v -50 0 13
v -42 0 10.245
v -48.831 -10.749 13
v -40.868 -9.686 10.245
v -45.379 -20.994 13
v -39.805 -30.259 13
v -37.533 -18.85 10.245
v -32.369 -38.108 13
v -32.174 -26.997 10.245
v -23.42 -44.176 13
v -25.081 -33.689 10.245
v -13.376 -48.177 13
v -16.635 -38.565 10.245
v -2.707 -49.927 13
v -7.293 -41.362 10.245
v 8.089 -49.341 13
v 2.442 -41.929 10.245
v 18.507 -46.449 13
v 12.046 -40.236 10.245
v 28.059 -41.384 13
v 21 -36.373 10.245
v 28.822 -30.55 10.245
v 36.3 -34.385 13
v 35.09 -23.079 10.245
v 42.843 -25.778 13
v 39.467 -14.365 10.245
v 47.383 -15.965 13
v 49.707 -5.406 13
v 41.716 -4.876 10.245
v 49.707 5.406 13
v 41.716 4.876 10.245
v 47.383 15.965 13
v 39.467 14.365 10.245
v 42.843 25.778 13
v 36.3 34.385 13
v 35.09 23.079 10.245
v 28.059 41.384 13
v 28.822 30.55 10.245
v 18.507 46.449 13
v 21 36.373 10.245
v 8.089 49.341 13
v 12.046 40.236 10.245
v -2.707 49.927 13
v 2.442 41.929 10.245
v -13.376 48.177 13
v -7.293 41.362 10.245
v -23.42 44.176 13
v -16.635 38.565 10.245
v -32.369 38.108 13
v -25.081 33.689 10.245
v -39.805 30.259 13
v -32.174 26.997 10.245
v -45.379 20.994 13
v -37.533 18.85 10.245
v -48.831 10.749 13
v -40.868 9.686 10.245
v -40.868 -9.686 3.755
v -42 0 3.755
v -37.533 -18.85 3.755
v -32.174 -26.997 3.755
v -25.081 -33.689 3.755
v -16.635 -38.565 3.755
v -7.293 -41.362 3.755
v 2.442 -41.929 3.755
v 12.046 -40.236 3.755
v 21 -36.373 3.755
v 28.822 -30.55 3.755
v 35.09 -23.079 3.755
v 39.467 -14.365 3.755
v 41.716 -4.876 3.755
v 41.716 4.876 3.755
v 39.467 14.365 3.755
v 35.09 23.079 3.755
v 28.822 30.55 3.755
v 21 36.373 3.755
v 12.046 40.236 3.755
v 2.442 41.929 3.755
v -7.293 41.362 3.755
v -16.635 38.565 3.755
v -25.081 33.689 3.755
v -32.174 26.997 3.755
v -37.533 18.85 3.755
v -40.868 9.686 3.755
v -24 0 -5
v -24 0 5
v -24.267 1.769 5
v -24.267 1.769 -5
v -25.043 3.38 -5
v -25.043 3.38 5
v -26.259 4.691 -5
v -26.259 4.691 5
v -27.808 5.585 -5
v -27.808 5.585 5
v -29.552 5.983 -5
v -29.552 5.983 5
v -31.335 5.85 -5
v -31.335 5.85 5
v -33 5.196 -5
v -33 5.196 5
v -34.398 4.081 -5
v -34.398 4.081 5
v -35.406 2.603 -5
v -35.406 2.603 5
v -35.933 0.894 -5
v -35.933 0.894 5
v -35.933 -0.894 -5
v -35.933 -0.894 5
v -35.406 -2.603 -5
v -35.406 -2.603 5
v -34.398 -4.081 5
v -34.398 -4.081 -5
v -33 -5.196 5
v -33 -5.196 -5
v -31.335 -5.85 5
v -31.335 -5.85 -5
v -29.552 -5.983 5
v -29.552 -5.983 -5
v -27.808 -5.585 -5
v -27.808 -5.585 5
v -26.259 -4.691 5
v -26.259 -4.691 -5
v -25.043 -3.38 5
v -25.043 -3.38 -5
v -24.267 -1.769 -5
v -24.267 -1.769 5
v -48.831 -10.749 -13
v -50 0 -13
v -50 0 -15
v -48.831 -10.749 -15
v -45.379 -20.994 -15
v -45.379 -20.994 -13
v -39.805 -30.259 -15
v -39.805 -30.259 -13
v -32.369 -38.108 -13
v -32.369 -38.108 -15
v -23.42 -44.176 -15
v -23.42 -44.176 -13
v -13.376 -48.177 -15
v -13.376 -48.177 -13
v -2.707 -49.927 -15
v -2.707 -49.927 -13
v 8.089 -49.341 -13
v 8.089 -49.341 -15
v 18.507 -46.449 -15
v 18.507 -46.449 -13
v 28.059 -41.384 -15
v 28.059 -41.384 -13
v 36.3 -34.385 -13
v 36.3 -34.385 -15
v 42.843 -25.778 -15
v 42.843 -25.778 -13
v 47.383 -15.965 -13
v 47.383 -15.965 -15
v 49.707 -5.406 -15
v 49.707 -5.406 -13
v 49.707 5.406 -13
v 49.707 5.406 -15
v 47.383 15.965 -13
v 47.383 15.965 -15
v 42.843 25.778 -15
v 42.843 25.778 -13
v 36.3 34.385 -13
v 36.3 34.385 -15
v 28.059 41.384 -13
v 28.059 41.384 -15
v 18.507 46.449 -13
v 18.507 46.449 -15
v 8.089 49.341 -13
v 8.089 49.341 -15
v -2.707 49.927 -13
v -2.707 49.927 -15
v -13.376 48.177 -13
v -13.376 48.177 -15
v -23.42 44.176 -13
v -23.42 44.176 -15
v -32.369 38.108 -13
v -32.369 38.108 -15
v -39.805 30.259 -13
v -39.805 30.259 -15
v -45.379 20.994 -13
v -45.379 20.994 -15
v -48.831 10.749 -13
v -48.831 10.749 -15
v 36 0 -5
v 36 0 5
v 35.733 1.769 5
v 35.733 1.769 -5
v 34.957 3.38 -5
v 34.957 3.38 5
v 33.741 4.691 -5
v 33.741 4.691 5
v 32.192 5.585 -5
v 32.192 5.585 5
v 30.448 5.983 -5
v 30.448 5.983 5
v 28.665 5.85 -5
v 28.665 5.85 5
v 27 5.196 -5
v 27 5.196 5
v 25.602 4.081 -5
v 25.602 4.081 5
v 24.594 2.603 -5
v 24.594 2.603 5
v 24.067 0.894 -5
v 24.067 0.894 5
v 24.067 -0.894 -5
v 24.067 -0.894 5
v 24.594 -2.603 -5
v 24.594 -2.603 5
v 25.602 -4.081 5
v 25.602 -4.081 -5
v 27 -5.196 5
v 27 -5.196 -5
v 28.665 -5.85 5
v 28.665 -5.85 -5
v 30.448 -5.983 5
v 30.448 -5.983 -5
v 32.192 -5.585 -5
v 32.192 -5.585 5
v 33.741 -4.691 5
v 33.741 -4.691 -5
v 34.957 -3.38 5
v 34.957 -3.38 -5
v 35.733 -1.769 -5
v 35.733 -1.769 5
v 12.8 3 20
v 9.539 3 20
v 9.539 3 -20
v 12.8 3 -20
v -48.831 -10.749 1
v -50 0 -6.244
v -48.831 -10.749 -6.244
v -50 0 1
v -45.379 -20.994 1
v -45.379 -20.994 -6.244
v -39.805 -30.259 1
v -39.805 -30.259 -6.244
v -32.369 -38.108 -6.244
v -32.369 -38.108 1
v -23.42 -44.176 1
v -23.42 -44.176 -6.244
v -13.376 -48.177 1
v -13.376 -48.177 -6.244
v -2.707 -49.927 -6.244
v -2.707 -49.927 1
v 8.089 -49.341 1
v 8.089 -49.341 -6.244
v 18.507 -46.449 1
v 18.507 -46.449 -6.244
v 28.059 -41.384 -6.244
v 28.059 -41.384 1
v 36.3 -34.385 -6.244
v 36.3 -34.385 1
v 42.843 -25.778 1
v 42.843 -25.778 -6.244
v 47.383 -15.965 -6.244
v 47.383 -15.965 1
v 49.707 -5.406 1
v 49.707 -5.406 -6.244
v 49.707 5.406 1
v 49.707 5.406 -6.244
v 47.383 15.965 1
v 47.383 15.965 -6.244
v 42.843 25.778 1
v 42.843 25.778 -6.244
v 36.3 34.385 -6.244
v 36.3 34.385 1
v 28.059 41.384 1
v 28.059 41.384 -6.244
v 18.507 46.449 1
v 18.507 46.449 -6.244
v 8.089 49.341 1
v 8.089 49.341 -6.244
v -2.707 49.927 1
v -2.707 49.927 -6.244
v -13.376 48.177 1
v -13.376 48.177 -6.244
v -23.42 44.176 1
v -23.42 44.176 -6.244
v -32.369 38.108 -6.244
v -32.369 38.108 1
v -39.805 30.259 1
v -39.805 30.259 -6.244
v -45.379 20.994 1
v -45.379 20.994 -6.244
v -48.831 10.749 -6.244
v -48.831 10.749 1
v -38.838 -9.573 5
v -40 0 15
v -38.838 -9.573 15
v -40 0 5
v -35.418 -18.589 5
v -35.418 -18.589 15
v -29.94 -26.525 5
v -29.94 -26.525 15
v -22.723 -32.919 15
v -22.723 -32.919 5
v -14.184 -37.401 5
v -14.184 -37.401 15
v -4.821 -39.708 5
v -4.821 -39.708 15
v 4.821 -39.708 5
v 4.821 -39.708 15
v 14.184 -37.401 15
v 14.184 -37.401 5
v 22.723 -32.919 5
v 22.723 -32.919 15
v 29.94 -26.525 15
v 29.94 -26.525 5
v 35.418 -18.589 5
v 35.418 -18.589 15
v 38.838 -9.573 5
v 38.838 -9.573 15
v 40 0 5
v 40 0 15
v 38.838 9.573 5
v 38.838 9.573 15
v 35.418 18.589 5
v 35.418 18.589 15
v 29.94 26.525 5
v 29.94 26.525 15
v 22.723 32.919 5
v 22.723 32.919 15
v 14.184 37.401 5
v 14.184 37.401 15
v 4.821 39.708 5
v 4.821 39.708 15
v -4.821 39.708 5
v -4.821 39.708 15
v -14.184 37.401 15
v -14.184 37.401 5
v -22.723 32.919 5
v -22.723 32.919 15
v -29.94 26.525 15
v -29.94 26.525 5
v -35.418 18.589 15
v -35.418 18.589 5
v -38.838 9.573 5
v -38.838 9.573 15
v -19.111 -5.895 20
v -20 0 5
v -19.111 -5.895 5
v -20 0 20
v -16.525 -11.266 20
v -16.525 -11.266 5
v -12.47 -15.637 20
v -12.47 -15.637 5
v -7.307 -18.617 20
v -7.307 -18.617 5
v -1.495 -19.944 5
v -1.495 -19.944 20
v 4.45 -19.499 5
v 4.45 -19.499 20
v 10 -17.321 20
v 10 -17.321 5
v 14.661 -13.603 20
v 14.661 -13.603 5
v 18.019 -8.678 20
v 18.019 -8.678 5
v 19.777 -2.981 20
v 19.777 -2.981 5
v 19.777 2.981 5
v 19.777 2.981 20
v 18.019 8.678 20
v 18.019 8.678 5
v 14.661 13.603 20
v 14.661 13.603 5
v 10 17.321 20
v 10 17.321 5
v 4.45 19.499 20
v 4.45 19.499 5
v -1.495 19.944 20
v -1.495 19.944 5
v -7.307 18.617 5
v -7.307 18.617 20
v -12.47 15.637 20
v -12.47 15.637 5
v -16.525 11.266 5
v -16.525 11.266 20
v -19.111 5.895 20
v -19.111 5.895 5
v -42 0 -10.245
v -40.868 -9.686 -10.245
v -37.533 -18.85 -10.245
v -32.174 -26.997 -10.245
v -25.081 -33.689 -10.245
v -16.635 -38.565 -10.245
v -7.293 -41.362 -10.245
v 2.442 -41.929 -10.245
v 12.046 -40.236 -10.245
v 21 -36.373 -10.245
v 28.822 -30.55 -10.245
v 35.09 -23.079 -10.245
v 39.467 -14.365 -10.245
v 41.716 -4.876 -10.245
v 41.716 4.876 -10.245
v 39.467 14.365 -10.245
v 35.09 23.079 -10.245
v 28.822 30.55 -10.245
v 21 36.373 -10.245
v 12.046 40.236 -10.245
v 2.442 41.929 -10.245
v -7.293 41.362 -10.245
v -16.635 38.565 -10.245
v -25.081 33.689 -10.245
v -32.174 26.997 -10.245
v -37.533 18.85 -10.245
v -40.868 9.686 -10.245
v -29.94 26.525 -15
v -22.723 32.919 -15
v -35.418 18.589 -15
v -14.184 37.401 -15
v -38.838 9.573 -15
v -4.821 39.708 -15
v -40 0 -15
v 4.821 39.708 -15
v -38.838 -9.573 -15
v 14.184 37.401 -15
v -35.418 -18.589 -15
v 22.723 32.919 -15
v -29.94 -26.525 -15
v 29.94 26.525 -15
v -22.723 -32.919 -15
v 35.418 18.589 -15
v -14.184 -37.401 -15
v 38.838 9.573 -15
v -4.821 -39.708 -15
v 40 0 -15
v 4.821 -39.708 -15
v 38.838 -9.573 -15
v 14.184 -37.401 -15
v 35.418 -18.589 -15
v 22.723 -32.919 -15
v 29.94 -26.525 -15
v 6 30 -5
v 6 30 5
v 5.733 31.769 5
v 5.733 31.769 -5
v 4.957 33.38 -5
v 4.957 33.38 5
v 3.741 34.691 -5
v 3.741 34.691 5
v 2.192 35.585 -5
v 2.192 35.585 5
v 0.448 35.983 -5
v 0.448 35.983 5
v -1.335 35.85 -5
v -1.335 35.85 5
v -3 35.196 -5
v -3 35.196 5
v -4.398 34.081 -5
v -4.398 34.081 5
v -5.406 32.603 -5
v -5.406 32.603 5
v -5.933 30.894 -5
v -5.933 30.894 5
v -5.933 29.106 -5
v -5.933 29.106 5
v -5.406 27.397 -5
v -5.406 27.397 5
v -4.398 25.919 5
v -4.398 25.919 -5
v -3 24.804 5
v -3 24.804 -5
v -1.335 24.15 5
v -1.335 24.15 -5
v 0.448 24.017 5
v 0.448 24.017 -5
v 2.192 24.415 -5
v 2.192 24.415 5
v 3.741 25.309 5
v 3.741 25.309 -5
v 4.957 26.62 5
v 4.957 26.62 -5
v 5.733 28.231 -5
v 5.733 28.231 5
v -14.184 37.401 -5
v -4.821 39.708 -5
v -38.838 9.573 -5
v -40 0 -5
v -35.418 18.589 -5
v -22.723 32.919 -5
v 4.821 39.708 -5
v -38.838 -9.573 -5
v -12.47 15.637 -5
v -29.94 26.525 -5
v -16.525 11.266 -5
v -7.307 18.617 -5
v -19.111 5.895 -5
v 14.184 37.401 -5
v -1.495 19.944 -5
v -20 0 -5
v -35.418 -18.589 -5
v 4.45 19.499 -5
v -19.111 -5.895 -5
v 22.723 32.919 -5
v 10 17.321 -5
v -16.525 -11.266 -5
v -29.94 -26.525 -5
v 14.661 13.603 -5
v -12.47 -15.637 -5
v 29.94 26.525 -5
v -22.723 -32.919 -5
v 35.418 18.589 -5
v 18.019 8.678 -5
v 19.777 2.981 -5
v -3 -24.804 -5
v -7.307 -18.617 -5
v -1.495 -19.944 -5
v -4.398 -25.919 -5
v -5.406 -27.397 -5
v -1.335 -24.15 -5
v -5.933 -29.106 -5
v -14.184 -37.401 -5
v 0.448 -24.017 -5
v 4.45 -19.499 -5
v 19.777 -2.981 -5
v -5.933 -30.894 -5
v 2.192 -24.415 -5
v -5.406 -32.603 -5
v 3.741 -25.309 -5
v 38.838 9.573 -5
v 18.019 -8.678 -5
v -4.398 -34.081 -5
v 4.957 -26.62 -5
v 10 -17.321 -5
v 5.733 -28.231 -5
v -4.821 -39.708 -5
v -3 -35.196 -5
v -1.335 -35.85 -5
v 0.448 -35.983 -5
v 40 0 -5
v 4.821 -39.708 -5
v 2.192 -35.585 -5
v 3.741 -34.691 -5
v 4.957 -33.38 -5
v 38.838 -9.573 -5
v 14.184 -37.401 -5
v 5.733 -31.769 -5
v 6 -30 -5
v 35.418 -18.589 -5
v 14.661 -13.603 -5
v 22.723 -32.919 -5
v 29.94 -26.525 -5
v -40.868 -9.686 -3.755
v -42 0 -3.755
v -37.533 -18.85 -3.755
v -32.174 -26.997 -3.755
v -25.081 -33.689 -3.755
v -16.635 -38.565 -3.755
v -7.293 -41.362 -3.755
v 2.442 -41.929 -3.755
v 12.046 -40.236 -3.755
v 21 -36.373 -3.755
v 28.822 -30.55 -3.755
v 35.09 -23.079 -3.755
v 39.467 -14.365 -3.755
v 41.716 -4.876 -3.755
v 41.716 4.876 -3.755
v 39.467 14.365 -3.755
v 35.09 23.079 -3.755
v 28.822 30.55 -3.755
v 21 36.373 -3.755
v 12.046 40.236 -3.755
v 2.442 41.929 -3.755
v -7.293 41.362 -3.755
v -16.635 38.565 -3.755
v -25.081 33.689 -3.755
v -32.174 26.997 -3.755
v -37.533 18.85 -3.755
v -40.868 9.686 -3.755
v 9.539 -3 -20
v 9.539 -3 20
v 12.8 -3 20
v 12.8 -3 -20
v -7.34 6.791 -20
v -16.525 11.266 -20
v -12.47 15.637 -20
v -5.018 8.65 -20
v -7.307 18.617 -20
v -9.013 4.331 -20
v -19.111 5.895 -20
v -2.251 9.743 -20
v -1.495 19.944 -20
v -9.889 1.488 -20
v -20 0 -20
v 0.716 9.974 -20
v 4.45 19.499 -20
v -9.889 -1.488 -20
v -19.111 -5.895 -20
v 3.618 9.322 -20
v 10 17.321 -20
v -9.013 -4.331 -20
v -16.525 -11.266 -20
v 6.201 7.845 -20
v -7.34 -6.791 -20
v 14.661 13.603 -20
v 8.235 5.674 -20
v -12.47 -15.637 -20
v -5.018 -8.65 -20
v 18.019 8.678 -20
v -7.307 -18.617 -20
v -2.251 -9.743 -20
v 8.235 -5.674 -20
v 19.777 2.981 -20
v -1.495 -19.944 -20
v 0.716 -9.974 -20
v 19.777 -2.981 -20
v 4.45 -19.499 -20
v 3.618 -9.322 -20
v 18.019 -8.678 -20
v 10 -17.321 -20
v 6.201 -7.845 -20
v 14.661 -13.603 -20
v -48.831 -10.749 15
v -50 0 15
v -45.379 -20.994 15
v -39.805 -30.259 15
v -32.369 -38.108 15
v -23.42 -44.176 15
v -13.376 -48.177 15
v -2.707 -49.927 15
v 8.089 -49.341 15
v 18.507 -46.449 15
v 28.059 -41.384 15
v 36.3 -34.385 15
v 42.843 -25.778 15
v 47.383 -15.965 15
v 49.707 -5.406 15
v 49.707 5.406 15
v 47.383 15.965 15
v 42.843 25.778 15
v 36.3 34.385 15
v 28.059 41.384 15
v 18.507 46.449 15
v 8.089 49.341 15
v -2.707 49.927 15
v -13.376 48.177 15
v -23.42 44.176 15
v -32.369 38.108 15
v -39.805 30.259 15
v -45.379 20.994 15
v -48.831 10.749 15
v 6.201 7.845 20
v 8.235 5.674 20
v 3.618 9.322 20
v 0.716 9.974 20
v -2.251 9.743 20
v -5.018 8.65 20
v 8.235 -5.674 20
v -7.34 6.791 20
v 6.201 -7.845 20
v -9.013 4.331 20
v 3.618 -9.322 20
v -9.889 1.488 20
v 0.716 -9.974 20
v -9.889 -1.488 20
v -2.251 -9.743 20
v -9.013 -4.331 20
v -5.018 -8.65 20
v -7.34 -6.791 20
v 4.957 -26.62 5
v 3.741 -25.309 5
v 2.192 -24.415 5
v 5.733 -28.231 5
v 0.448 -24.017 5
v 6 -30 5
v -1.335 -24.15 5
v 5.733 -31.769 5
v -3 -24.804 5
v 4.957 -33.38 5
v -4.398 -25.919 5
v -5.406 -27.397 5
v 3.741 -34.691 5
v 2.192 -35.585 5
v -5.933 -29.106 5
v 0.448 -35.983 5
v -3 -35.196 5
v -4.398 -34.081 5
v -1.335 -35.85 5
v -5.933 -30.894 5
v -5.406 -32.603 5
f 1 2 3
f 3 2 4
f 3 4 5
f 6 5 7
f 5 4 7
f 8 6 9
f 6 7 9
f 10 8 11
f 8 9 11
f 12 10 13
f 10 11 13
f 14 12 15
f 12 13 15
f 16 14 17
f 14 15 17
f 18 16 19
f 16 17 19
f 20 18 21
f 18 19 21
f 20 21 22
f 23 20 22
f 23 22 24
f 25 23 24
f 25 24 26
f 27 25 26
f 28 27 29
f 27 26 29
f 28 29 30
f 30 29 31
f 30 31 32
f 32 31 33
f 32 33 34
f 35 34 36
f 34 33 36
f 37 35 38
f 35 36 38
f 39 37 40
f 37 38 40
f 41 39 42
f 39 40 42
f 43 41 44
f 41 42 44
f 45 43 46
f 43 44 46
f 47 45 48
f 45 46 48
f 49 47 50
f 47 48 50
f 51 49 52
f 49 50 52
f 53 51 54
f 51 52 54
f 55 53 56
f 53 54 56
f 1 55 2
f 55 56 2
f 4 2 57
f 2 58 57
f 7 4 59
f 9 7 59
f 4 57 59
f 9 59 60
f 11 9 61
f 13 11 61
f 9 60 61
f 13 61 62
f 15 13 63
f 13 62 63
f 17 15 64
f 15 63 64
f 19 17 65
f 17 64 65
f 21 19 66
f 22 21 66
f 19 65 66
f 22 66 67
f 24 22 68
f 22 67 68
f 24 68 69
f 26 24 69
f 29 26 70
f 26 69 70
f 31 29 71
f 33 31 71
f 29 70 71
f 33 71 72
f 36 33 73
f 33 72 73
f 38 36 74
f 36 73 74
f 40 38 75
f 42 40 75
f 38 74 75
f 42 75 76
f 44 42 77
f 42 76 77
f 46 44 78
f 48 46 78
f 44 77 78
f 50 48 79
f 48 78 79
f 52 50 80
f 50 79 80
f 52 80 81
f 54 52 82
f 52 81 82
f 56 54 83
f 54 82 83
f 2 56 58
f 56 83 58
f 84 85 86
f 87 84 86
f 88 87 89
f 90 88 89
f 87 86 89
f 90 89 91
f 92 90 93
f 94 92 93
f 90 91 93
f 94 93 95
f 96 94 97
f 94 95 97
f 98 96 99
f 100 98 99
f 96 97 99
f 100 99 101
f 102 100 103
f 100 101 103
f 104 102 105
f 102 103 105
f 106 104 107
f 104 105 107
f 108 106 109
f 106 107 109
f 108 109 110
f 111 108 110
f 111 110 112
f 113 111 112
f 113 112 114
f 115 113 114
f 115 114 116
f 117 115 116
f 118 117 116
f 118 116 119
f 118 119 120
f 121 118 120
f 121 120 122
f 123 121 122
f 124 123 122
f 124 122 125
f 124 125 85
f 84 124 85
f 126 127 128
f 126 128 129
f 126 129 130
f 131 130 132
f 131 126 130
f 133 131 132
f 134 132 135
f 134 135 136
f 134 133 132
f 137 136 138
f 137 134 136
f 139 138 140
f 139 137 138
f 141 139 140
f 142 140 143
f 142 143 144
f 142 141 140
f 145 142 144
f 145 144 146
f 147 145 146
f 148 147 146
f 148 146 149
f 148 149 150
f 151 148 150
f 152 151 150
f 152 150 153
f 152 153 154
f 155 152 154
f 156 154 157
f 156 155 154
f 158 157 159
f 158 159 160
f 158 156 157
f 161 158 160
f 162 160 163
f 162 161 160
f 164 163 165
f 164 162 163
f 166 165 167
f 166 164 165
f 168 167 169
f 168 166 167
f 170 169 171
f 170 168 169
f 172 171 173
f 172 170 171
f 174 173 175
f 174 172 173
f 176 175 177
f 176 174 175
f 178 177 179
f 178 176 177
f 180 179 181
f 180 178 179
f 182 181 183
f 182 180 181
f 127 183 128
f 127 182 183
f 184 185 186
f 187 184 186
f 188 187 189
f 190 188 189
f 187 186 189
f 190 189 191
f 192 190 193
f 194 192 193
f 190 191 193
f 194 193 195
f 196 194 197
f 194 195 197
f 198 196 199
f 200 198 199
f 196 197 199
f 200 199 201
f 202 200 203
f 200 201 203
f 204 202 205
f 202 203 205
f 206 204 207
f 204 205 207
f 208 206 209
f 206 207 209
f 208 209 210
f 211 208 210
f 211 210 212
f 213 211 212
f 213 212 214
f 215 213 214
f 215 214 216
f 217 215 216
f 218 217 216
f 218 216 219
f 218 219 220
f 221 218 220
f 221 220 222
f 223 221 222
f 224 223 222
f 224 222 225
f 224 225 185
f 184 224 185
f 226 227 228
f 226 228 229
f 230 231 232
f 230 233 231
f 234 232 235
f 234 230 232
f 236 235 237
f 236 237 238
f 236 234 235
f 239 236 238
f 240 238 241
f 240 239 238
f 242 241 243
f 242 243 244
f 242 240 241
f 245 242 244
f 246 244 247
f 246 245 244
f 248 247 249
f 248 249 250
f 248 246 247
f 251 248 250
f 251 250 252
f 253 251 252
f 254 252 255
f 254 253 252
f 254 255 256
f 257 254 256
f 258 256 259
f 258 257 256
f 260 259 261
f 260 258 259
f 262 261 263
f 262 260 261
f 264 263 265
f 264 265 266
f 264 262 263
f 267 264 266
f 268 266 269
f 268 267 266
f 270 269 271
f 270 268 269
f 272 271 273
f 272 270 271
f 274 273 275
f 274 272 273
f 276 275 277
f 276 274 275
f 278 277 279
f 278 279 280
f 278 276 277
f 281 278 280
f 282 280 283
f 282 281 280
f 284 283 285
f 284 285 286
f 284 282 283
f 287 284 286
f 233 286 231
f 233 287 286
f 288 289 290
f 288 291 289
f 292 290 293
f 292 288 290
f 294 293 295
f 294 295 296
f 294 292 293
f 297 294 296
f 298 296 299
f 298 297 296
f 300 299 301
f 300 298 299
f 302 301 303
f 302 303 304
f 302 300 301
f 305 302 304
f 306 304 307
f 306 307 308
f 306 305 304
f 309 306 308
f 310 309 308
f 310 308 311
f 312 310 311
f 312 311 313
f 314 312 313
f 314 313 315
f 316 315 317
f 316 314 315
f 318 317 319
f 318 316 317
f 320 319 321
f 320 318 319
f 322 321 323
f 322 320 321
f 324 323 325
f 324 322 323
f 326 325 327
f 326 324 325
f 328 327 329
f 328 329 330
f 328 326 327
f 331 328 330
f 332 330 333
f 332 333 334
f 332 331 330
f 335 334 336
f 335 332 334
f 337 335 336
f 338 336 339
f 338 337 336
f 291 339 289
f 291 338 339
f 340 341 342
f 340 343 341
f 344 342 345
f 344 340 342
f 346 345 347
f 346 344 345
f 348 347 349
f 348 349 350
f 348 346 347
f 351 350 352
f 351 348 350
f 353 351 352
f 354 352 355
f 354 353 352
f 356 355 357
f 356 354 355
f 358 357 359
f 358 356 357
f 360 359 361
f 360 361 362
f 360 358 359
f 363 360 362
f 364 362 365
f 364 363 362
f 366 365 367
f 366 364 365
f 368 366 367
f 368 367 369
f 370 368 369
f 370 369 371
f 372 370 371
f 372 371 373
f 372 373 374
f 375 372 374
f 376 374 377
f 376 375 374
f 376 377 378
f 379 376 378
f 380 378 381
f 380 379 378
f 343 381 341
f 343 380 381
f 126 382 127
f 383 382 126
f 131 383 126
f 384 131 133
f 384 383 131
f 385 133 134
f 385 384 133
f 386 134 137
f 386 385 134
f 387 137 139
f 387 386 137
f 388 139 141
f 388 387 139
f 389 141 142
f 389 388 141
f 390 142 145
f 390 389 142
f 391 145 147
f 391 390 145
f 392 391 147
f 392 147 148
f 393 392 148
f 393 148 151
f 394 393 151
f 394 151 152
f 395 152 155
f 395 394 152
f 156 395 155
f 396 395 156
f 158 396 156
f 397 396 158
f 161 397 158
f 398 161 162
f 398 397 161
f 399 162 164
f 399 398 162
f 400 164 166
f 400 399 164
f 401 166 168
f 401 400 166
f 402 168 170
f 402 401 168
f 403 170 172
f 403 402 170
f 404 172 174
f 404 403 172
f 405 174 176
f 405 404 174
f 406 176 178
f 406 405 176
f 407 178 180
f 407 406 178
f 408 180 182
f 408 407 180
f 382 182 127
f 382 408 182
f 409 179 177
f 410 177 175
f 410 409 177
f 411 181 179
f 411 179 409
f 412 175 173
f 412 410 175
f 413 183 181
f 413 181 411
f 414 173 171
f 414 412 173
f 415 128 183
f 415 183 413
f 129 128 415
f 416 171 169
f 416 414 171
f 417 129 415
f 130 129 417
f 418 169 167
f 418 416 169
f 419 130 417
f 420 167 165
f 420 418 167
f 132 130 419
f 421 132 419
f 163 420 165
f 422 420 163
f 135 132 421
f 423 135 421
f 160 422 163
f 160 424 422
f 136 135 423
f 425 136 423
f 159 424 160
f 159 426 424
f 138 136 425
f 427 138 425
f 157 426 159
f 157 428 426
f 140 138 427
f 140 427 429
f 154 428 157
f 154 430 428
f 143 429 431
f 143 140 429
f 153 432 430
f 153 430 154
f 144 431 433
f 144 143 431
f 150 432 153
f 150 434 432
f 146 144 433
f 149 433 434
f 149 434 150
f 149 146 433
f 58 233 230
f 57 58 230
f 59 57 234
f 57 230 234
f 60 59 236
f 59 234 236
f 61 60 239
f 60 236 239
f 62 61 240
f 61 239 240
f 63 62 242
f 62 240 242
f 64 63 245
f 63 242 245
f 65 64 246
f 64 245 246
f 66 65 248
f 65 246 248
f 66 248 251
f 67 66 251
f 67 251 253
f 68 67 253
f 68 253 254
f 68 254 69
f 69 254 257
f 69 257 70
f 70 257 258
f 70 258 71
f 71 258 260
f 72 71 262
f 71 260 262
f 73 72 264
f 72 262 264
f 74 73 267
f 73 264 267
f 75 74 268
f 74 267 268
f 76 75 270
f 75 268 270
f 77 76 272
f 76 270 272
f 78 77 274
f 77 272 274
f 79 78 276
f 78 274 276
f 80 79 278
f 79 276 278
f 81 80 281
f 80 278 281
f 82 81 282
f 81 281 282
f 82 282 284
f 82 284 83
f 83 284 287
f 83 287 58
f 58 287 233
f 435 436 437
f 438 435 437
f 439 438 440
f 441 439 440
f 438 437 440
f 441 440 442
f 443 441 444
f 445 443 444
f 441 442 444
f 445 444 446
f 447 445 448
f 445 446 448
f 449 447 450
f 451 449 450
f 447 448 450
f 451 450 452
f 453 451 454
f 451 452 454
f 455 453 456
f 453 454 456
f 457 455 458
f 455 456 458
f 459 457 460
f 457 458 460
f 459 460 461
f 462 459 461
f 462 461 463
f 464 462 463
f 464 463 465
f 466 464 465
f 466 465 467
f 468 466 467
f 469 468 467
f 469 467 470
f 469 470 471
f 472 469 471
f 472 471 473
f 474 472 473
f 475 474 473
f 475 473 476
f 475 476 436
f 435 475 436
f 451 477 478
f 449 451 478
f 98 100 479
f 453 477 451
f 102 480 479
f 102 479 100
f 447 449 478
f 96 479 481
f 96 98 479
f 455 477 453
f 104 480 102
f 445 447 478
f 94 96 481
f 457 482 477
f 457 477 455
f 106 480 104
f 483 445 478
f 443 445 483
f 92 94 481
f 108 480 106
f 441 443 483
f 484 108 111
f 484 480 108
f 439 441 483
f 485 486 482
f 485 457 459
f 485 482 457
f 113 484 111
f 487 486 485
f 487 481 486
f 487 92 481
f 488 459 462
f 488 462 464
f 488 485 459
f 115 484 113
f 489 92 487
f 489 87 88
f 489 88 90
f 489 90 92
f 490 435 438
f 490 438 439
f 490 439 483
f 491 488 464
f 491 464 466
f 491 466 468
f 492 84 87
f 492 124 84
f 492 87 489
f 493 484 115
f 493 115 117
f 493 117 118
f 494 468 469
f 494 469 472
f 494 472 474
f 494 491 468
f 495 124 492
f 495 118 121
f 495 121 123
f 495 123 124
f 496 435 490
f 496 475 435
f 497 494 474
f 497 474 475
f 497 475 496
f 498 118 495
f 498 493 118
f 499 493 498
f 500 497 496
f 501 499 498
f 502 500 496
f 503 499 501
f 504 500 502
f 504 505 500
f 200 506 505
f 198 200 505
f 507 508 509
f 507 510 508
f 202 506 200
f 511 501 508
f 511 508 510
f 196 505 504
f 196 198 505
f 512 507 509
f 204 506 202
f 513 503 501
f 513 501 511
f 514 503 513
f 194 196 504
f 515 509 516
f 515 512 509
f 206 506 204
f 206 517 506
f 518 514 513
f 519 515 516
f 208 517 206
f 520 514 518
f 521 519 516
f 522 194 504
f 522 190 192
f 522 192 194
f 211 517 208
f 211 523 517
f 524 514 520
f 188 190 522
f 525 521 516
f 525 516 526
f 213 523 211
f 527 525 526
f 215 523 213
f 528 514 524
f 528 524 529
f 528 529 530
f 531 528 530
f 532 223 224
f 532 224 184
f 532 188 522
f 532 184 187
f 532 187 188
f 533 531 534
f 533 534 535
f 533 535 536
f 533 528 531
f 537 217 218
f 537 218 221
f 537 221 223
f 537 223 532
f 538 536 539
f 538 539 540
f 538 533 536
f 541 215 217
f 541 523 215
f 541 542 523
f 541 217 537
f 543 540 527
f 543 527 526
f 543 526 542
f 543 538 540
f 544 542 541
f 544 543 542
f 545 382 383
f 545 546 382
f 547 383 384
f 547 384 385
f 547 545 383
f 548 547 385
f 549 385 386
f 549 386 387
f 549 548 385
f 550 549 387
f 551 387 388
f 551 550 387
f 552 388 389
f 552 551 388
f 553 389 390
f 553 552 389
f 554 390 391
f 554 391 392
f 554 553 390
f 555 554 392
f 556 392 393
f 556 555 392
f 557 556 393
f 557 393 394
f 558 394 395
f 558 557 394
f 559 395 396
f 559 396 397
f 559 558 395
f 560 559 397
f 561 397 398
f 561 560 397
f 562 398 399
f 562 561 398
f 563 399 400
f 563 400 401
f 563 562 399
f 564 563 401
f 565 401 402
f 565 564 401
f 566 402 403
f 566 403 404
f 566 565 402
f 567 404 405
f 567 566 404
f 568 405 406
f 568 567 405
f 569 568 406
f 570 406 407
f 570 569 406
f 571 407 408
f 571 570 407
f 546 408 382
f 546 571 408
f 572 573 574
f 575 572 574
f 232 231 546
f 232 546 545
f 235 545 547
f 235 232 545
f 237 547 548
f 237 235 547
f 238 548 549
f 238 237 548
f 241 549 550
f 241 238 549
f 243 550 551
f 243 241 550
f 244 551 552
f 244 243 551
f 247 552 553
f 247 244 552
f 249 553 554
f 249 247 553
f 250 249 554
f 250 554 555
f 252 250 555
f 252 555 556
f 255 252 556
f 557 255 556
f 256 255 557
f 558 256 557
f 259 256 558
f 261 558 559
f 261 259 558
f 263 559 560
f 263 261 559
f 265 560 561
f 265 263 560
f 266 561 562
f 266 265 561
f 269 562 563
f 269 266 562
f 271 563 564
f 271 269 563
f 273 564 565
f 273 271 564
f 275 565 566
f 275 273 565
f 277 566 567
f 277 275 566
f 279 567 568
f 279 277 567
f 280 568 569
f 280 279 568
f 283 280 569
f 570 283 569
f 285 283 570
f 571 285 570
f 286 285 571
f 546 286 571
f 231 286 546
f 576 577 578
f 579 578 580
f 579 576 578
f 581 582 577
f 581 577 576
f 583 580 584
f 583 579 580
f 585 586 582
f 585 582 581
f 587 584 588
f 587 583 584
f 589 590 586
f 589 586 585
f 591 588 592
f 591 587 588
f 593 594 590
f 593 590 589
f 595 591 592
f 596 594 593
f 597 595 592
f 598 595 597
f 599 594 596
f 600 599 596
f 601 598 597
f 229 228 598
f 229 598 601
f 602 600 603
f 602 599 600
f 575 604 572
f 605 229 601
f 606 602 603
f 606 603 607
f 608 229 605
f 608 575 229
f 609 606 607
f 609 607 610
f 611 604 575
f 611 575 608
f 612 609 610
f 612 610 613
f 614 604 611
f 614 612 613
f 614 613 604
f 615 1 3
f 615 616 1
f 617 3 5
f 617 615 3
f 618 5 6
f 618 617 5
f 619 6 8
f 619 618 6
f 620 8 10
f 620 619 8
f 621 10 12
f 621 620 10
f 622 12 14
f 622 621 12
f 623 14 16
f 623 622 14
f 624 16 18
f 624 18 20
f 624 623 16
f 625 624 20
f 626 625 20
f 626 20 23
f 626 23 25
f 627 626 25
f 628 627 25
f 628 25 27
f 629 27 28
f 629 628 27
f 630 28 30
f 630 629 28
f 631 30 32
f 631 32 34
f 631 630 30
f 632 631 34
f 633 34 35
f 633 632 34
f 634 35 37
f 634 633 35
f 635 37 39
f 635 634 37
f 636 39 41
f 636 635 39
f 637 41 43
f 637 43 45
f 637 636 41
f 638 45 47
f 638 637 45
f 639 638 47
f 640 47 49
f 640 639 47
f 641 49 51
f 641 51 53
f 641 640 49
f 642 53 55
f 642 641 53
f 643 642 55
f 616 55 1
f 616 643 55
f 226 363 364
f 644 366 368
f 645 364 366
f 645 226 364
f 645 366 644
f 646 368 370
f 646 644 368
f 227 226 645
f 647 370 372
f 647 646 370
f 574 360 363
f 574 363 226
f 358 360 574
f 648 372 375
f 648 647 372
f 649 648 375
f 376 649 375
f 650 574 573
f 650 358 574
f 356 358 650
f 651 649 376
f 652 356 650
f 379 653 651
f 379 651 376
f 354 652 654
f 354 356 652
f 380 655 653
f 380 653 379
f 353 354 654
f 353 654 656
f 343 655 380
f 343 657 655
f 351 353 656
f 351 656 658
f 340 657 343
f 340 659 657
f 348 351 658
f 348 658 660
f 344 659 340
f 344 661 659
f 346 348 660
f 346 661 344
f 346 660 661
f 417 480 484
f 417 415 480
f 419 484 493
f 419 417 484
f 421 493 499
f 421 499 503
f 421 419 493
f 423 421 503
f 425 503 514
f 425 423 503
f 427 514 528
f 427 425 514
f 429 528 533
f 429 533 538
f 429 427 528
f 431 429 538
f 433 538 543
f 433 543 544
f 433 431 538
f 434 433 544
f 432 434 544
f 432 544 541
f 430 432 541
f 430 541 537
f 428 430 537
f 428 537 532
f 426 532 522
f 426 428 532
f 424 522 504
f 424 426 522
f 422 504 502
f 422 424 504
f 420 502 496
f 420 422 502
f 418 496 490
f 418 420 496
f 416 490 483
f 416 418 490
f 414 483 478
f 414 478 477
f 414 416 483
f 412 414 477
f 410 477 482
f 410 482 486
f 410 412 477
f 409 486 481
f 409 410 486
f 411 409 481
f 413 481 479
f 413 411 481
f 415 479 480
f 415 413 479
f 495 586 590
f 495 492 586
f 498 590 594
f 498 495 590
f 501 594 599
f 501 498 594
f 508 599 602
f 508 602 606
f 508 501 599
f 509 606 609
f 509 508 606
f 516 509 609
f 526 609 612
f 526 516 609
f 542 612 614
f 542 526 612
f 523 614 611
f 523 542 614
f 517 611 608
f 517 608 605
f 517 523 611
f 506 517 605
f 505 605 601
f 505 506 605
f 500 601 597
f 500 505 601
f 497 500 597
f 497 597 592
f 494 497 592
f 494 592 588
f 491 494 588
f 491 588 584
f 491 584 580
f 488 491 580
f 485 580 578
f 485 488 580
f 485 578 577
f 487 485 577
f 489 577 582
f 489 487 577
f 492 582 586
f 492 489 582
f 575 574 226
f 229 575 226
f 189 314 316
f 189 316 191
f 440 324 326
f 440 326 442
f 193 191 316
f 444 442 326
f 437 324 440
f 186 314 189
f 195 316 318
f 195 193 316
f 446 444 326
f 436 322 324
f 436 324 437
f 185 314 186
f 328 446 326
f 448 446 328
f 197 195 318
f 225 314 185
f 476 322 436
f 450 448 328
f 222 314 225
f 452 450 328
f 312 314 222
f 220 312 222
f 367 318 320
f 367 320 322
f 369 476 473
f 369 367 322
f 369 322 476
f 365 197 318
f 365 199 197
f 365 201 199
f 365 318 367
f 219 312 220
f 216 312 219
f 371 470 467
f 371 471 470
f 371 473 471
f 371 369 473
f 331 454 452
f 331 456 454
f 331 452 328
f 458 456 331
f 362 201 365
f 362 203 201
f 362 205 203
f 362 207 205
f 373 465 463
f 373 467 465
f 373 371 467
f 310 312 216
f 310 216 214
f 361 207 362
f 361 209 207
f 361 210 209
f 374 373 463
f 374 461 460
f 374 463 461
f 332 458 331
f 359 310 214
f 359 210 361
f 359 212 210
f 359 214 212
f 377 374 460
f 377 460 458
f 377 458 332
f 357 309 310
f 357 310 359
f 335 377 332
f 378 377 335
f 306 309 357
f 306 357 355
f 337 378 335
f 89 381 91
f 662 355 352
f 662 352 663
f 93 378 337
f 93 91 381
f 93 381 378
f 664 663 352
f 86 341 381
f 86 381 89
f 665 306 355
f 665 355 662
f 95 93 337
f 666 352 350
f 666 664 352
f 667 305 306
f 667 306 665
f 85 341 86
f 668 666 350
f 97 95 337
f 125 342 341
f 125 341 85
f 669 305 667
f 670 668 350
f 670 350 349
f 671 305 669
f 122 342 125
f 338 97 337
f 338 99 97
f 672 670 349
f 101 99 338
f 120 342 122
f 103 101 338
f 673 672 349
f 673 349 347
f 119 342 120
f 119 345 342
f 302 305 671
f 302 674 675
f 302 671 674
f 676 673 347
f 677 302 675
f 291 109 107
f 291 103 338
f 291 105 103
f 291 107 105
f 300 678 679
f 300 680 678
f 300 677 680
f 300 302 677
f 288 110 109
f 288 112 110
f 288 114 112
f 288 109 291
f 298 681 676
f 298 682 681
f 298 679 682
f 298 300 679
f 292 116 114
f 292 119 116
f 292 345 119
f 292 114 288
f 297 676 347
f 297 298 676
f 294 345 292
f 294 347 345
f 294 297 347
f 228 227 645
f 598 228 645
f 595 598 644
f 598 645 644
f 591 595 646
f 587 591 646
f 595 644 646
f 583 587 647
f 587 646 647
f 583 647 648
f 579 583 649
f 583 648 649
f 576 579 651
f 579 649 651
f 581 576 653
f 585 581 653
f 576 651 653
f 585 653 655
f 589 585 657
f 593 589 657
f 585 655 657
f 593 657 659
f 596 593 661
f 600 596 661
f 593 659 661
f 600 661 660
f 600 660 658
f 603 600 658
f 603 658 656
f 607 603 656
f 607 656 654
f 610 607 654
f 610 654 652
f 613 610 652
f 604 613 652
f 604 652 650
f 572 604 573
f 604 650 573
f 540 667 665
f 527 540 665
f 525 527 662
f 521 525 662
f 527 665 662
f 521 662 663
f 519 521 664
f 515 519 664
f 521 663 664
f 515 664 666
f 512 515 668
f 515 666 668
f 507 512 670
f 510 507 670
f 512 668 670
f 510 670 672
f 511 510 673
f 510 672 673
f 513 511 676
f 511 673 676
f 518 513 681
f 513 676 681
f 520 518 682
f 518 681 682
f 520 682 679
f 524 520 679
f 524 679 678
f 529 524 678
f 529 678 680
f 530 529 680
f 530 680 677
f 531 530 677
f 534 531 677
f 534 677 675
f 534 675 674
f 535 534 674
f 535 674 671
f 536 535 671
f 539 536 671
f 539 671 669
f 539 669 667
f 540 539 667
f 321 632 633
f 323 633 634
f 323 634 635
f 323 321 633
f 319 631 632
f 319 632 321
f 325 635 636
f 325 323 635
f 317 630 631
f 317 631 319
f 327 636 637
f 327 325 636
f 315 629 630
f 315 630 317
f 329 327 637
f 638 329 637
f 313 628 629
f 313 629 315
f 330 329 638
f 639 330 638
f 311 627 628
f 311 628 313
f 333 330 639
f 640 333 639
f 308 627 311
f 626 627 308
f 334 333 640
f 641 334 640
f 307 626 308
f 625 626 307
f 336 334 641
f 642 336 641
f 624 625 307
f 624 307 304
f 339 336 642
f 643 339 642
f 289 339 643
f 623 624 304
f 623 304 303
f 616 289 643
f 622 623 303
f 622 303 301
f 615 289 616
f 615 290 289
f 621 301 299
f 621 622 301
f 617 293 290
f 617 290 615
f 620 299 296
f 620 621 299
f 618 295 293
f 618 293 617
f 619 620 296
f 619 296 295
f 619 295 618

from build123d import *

# Parameters (mm, degrees)
SKETCH_3_W          = 12.8
SKETCH_3_H          = 6
CUT_EXTRUDE_1_DEPTH = 82.240384046
SKETCH_4_R          = 6
CUT_EXTRUDE_2_DEPTH = 82.240384046
SKETCH_5_R          = 10
CUT_EXTRUDE_3_DEPTH = 101


with BuildPart() as part:
    # 草图1 → 旋转1 (revolve)
    with BuildSketch(Plane(origin=(0, 0, 0), x_dir=(1, 0, 0), z_dir=(0, 1, 0)), mode=Mode.PRIVATE) as revolve_1_sk:
        Polygon((0, 20), (20, 20), (20, 5), (40, 5), (40, 15), (50, 15), (50, -15), (40, -15), (40, -5), (20, -5), (20, -20), (0, -20), align=None)
    revolve(revolve_1_sk.sketch.rotate(Axis((0, 0, -20), (0, 0, 1)), 180), axis=Axis((0, 0, -20), (0, 0, 1)))

    # 草图2 → 切除-旋转1 (revolve, cut)
    with BuildSketch(Plane(origin=(0, 0, 0), x_dir=(1, 0, 0), z_dir=(0, 1, 0)), mode=Mode.PRIVATE) as cut_revolve_1_sk:
        Polygon((42, -3.75465), (51, -0.65567), (51, -13.34433), (42, -10.24535), align=None)
        Polygon((42, 3.75465), (51, 6.55567), (51, 13.34433), (42, 10.24535), align=None)
    revolve(cut_revolve_1_sk.sketch.rotate(Axis((0, 0, -20), (0, 0, 1)), 180), axis=Axis((0, 0, -20), (0, 0, 1)), mode=Mode.SUBTRACT)

    # 草图3 → 切除-拉伸1 (cut, through all)
    with BuildSketch(Plane.XY.offset(20)):
        with Locations((6.4, 0)):
            Rectangle(SKETCH_3_W, SKETCH_3_H)
    extrude(amount=-CUT_EXTRUDE_1_DEPTH, mode=Mode.SUBTRACT)

    # 草图4 → 切除-拉伸2 (cut, through all)
    with BuildSketch(Plane.XY.offset(20)):
        with Locations((30, 0)):
            Circle(SKETCH_4_R)
        with Locations((0, 30)):
            Circle(SKETCH_4_R)
        with Locations((-30, 0)):
            Circle(SKETCH_4_R)
        with Locations((0, -30)):
            Circle(SKETCH_4_R)
    extrude(amount=-CUT_EXTRUDE_2_DEPTH, mode=Mode.SUBTRACT)

    # 草图5 → 切除-拉伸3 (cut, symmetric)
    with BuildSketch(Plane.XY.offset(20)):
        Circle(SKETCH_5_R)
    extrude(amount=CUT_EXTRUDE_3_DEPTH, both=True, mode=Mode.SUBTRACT)


solid = part.part
